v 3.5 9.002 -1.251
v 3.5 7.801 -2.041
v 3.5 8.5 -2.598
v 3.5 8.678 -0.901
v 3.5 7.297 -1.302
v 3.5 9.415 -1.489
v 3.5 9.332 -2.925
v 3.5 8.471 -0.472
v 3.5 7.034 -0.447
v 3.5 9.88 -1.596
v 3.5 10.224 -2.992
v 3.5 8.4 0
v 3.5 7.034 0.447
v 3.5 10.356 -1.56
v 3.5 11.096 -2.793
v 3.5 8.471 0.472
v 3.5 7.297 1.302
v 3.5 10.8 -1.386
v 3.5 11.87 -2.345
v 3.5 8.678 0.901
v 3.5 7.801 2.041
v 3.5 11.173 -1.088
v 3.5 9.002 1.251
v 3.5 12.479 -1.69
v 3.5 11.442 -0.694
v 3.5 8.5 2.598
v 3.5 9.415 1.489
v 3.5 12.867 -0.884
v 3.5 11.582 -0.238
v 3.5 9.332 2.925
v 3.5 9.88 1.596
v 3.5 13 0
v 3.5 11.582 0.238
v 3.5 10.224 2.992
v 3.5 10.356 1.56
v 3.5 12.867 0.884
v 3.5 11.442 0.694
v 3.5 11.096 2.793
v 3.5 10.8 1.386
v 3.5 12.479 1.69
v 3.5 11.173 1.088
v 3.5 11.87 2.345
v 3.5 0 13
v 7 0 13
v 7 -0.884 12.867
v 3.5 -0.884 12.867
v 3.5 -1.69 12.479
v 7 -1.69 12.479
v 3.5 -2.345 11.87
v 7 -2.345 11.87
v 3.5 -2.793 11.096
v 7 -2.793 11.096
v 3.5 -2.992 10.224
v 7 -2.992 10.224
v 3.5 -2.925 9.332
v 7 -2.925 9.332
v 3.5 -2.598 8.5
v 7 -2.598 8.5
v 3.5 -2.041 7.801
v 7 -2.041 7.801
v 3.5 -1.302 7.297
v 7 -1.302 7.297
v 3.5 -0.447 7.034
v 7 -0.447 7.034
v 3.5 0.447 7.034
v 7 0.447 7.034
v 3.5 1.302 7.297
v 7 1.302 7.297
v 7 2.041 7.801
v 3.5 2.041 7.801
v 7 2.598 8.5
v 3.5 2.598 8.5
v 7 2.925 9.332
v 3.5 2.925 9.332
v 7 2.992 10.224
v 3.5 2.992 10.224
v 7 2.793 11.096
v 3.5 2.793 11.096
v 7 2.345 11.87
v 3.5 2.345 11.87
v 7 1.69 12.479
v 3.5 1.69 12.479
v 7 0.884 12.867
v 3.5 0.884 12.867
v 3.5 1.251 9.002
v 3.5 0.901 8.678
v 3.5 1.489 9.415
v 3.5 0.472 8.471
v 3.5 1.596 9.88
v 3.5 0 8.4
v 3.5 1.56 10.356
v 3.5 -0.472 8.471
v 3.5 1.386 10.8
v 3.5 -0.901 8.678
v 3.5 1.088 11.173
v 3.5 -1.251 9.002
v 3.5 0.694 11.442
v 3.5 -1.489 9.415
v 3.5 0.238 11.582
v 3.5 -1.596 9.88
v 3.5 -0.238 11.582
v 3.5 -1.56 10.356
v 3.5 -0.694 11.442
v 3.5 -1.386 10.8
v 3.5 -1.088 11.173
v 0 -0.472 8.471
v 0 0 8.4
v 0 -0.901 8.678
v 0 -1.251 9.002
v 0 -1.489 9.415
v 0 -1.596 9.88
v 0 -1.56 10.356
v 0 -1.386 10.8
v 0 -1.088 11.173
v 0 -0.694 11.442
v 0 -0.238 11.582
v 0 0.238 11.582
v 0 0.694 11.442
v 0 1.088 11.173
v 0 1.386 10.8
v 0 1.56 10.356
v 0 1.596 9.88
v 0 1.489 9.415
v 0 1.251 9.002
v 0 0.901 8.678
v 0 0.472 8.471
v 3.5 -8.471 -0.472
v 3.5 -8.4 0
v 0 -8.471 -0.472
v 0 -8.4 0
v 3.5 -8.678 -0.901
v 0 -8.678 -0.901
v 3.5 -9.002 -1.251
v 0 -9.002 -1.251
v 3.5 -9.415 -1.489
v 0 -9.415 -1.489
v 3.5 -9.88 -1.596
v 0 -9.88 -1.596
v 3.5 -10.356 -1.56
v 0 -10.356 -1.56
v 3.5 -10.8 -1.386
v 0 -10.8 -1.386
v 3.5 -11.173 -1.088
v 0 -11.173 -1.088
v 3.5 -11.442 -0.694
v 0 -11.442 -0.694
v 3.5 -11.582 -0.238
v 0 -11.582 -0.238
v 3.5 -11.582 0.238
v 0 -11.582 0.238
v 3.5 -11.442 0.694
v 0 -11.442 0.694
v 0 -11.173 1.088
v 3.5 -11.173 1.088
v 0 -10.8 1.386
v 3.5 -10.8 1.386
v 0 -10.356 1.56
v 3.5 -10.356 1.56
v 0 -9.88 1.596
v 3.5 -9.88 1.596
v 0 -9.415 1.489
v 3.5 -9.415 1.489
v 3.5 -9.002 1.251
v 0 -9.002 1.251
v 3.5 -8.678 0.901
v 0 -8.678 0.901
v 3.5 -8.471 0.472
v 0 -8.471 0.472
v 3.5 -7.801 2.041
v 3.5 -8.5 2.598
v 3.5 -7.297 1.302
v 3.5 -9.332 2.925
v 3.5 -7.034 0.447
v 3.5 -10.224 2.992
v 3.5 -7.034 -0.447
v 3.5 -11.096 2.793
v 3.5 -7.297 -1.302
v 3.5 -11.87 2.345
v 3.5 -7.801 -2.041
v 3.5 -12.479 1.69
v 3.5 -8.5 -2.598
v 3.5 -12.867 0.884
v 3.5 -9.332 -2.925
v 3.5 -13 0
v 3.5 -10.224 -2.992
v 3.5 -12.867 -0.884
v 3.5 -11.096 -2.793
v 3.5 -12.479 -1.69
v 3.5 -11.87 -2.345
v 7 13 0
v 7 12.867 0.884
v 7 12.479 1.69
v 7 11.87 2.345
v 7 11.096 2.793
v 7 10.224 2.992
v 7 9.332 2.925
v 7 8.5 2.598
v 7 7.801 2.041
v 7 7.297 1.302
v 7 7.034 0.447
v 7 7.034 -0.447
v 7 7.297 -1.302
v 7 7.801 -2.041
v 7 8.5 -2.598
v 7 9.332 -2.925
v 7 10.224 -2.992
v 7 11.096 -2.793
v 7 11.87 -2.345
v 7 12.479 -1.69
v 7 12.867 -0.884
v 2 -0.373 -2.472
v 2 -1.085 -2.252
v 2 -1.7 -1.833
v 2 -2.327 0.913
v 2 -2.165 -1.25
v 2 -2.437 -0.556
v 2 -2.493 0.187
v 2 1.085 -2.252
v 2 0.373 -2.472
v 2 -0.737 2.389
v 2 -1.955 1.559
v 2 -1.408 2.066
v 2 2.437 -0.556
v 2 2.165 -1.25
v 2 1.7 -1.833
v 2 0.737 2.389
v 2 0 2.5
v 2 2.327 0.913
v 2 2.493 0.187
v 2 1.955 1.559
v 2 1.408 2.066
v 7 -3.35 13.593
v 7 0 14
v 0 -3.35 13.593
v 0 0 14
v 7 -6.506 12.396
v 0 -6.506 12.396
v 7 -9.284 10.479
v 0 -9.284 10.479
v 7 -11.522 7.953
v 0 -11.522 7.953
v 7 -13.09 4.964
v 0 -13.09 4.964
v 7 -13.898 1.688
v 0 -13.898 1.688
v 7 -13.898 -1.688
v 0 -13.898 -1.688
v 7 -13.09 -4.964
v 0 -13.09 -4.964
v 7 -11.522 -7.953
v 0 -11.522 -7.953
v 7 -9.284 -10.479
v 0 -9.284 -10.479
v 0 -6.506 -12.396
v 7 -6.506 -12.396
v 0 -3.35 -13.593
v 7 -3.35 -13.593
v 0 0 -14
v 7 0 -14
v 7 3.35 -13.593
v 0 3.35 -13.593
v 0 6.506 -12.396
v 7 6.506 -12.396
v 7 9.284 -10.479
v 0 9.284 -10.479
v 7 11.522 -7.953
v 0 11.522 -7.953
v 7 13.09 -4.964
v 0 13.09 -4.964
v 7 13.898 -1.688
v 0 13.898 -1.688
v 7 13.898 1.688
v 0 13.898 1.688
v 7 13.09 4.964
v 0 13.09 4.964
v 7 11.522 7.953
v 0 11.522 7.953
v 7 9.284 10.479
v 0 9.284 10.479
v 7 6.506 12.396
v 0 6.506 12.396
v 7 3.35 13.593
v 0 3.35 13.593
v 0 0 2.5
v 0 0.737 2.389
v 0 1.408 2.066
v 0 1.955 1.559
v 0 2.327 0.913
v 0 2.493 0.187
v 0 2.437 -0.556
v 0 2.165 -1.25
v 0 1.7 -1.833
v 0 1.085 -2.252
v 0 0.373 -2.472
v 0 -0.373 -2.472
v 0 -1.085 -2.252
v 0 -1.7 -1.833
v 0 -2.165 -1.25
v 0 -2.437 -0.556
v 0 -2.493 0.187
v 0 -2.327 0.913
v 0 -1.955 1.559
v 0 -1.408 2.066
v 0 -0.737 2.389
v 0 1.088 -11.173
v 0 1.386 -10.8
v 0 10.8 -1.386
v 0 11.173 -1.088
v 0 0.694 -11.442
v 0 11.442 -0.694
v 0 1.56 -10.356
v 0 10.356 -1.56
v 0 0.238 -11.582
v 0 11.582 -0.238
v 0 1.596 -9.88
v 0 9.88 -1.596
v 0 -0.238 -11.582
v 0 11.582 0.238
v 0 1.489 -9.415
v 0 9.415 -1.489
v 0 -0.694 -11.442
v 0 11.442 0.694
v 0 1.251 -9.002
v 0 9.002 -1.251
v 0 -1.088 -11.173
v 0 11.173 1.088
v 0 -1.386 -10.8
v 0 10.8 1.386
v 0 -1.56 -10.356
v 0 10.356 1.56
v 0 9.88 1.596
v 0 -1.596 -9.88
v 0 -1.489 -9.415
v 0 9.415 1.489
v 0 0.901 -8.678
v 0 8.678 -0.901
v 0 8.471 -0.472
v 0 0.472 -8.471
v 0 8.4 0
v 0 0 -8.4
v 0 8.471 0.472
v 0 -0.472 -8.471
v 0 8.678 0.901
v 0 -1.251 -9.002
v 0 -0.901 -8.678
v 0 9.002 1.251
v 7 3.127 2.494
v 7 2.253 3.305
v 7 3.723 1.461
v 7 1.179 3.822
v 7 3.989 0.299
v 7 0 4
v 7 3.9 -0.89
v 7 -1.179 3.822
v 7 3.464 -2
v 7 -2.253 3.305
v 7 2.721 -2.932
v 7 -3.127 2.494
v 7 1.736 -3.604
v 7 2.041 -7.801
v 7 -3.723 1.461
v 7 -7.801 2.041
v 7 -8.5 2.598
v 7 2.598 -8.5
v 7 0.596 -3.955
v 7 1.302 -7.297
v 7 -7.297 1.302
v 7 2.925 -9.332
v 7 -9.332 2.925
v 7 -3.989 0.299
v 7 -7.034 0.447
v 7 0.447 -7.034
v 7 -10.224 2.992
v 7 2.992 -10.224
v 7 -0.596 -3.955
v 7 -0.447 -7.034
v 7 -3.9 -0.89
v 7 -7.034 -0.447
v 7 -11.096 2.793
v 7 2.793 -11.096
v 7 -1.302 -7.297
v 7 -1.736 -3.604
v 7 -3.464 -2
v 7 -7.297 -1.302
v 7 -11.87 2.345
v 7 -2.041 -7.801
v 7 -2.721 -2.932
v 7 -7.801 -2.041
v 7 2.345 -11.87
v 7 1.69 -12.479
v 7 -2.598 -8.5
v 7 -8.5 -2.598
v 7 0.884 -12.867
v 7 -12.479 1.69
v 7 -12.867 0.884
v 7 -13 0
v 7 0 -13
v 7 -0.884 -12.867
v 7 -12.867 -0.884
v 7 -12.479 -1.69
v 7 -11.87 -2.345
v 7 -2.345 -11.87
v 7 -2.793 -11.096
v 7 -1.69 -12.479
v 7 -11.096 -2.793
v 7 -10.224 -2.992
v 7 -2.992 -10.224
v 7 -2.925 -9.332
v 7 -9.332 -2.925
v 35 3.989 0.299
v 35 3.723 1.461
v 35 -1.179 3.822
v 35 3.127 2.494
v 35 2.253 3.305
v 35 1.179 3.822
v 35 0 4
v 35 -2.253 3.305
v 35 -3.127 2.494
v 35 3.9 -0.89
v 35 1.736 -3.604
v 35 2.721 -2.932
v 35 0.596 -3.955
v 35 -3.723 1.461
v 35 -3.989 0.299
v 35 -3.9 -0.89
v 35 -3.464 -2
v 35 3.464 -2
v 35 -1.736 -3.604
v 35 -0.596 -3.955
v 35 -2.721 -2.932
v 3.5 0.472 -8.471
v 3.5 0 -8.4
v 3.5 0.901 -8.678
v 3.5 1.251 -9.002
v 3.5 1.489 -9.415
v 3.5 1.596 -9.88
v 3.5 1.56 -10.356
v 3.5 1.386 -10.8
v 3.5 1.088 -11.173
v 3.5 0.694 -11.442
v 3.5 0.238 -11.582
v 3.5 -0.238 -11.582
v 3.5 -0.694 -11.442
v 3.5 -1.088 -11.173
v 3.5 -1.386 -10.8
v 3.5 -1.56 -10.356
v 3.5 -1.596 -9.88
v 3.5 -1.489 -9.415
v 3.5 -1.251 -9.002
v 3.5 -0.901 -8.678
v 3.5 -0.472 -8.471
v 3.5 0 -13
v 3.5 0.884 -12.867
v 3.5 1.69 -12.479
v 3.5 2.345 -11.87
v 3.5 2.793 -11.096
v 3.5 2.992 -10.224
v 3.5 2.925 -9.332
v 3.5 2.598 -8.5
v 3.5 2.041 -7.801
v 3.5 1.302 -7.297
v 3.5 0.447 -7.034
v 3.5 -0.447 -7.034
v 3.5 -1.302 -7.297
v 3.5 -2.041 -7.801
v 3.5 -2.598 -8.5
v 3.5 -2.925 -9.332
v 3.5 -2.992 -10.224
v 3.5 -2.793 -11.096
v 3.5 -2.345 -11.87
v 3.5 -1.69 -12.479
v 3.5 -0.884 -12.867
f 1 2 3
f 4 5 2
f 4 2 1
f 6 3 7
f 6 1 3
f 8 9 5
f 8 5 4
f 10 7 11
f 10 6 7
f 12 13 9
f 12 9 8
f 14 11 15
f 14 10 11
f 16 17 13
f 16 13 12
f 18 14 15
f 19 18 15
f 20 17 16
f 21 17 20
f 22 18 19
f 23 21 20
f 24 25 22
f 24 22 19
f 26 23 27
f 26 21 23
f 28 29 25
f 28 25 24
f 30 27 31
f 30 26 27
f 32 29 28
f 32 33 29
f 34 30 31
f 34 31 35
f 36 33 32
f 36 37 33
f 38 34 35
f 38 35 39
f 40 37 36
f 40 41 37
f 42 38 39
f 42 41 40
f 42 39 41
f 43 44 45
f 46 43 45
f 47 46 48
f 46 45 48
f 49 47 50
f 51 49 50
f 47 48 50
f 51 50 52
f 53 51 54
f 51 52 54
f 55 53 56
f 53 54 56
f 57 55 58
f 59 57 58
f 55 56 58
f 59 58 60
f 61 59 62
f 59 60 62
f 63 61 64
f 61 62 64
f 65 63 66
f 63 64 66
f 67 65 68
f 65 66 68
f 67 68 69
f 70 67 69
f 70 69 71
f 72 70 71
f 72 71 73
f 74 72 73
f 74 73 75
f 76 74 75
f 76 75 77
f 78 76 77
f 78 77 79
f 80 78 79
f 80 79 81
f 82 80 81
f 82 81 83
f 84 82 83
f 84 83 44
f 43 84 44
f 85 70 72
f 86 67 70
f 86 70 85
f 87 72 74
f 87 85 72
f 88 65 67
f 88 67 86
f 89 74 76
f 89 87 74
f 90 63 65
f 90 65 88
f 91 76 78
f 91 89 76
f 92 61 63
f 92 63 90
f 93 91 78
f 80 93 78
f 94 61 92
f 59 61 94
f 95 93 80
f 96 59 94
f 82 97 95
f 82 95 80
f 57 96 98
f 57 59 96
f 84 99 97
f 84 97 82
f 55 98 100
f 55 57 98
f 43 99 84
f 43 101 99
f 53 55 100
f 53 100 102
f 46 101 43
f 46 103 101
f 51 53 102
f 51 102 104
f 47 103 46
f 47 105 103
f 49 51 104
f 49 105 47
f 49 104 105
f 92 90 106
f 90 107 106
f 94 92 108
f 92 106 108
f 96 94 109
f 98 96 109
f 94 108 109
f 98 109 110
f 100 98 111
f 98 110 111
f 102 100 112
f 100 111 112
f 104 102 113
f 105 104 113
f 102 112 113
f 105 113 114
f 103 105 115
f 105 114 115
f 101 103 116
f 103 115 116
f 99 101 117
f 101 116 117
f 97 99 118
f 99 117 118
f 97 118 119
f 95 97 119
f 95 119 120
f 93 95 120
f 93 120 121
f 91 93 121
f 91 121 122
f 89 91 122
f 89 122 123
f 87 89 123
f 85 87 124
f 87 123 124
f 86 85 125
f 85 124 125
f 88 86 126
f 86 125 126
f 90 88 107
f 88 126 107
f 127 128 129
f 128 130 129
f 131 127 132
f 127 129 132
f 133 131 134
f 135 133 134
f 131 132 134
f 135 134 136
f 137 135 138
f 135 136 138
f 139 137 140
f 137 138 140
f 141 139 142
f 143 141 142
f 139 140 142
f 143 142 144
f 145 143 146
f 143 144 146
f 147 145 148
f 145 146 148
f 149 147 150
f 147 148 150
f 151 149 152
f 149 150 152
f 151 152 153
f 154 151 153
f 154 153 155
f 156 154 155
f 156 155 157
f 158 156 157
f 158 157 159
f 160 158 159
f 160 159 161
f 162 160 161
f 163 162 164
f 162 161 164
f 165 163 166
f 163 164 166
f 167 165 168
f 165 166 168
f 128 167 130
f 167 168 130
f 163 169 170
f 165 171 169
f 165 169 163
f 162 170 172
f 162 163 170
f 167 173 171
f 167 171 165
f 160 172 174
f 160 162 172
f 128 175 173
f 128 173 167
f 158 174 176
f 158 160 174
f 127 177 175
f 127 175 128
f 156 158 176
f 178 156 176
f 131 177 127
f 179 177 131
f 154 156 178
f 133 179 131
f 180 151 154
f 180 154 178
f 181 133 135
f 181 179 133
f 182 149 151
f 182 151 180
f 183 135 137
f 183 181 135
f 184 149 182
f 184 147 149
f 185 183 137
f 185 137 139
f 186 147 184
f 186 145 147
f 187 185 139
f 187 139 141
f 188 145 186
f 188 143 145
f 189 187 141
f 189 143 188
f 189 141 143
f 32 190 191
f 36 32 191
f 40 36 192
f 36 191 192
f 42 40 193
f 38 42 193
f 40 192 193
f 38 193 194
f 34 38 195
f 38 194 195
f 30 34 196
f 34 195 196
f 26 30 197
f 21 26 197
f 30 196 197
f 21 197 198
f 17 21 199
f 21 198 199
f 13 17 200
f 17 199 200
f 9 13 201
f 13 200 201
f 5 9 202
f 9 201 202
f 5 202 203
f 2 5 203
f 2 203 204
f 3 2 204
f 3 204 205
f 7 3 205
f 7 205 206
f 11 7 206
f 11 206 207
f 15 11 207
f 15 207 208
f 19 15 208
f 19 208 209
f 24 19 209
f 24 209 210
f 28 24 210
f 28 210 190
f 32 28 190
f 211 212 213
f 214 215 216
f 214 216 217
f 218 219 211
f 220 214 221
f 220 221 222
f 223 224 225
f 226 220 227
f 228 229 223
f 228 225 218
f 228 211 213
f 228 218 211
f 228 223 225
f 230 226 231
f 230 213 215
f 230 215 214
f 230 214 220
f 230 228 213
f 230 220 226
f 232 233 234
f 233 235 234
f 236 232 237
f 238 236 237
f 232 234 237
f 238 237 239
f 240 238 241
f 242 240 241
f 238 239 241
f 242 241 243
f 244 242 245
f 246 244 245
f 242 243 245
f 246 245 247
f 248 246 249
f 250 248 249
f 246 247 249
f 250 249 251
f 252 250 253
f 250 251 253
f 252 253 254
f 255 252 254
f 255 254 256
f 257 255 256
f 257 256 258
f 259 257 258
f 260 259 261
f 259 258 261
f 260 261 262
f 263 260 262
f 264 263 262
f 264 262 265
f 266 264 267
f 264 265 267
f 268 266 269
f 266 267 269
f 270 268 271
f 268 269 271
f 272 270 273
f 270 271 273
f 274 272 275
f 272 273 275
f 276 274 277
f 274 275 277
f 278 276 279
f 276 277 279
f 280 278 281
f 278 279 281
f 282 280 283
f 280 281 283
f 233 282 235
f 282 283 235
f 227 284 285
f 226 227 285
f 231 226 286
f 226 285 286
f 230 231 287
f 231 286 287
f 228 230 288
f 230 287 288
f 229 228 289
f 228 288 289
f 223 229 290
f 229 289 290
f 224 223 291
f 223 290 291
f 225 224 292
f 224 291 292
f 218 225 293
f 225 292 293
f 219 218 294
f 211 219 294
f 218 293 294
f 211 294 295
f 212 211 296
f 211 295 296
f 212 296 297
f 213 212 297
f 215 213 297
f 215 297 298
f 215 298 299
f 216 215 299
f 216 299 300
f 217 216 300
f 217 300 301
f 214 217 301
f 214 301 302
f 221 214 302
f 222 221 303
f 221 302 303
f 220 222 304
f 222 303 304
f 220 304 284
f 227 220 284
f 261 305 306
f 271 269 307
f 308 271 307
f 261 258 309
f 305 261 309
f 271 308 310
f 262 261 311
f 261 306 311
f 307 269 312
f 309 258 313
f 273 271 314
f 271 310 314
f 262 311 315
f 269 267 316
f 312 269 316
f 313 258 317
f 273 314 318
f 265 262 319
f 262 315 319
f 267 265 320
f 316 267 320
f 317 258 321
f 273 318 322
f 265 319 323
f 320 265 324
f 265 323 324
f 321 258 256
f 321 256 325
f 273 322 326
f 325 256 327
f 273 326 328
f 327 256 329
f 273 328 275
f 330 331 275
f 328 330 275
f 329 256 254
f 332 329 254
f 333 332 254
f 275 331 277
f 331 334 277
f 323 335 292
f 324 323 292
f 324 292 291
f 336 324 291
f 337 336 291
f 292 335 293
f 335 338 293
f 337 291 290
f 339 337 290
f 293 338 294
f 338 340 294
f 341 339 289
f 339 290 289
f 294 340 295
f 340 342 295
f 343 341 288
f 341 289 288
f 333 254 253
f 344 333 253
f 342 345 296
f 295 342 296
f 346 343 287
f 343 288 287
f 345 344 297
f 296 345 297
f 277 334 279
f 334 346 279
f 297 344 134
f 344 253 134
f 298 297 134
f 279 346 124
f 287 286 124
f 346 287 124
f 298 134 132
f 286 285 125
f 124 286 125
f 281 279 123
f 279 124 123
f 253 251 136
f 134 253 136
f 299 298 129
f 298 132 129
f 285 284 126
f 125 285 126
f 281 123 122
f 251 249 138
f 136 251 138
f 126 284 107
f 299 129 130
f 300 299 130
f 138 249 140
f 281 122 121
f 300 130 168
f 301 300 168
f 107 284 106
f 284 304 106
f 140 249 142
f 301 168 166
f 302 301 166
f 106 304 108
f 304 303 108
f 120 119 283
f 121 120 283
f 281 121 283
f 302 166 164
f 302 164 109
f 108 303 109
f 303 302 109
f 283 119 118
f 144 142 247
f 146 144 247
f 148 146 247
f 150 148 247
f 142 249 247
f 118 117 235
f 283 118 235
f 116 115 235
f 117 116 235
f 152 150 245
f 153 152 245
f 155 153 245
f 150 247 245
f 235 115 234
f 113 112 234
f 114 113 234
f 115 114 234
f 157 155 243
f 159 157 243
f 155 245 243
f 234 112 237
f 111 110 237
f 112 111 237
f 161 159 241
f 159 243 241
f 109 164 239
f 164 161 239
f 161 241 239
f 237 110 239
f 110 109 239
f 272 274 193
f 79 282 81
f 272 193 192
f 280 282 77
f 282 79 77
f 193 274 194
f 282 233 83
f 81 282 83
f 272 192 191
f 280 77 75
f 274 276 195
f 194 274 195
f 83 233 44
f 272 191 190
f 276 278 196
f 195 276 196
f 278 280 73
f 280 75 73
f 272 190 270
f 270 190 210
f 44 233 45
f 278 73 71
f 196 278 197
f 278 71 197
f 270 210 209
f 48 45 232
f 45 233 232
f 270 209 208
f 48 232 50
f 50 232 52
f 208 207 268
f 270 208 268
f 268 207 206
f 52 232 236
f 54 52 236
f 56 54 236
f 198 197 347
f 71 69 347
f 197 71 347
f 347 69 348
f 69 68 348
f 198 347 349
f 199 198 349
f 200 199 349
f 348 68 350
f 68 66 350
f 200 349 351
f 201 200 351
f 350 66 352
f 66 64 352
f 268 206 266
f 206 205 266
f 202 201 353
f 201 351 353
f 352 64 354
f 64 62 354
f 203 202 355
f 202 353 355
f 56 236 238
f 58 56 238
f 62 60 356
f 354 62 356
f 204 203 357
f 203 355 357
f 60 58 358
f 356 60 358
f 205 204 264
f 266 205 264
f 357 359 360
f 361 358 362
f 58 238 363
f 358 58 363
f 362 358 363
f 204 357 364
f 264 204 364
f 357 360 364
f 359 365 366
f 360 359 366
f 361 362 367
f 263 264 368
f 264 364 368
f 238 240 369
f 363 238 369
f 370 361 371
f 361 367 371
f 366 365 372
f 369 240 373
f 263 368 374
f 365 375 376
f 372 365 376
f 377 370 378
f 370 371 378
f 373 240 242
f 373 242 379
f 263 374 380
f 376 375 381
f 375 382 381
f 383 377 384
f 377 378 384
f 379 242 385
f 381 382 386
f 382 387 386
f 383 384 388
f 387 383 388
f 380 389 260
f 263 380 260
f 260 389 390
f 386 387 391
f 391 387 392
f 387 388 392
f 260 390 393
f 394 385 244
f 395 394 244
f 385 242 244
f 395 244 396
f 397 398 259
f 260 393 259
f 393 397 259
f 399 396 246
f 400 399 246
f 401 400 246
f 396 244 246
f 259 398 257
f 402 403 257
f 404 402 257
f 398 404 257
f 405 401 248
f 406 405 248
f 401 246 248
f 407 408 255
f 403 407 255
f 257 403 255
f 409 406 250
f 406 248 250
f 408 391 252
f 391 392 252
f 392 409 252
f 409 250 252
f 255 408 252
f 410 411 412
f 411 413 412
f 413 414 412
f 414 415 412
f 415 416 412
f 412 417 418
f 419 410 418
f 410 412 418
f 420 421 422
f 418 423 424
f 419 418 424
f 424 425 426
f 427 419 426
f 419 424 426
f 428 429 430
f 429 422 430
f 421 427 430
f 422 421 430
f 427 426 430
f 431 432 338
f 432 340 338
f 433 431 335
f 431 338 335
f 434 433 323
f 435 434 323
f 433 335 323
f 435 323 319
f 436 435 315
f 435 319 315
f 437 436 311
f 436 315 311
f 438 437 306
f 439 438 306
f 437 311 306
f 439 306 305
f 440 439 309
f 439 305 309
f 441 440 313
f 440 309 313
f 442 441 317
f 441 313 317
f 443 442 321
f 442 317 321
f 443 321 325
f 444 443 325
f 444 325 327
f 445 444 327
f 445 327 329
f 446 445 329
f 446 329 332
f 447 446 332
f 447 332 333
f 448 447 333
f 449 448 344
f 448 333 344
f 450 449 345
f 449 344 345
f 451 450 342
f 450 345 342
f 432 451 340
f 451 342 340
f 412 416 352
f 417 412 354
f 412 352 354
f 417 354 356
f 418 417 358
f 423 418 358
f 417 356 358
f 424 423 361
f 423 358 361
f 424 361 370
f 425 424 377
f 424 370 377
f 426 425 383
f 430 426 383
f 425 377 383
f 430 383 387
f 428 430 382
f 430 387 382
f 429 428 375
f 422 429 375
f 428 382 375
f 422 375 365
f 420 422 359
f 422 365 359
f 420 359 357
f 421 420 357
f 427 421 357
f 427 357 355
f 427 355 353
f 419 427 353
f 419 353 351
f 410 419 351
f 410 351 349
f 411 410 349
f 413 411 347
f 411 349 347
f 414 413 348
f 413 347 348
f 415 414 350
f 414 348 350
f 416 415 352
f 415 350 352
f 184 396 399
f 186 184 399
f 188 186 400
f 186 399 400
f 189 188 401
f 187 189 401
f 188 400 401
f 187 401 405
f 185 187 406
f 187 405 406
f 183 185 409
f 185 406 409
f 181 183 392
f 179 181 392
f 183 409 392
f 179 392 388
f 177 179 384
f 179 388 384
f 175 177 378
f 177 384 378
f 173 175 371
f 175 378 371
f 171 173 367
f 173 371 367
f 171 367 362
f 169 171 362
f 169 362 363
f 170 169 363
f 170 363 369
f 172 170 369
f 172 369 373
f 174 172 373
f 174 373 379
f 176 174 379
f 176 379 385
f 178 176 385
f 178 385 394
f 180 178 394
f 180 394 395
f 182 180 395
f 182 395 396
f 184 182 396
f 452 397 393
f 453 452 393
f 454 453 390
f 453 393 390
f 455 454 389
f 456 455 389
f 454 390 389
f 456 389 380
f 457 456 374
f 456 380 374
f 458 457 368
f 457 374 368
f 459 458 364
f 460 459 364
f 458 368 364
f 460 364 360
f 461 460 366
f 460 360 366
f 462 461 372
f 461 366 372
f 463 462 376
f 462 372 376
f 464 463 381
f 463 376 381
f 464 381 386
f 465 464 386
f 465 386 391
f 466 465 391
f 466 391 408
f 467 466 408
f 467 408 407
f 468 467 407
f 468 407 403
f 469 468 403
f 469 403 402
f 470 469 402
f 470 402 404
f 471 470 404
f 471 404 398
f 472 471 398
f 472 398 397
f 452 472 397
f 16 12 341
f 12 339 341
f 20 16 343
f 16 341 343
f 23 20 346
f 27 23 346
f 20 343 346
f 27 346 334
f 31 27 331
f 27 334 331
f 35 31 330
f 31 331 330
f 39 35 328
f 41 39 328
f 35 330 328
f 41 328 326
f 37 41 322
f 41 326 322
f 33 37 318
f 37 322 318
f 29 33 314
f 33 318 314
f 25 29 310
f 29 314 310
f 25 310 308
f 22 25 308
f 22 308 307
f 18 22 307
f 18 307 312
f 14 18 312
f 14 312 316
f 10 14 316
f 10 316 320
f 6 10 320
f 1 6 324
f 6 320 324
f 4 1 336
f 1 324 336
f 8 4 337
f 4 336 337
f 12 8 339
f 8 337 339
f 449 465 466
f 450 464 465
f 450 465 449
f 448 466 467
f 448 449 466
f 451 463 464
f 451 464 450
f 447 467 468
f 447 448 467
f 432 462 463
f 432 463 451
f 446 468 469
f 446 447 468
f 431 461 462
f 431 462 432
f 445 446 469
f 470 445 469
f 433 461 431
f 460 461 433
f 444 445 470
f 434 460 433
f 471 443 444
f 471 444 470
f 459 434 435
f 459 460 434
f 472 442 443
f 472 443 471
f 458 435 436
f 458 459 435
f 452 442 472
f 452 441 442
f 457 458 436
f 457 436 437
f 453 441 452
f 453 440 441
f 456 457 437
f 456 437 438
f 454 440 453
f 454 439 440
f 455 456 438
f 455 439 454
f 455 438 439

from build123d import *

# Parameters (mm, degrees)
CBORE_FOR_M3_SBHCS1_D           = 3.2
CBORE_FOR_M3_SBHCS1_CBORE_D     = 6
CBORE_FOR_M3_SBHCS1_CBORE_DEPTH = 3.5
CIRPATTERN1_COUNT               = 4
SKETCH5_R                       = 2.5
CUT_EXTRUDE1_DEPTH              = 2


with BuildPart() as part:
    # Sketch2 → Revolve2 (revolve)
    with BuildSketch(Plane.XY, mode=Mode.PRIVATE) as revolve2_sk:
        Polygon((0, 14), (0, 0), (35, 0), (35, 4), (7, 4), (7, 14), align=None)
    revolve(revolve2_sk.sketch.rotate(Axis((0, 0, 0), (1, 0, 0)), 90), axis=Axis((0, 0, 0), (1, 0, 0)))

    # CBORE for M3 SBHCS1 (through all)
    with Locations(Plane(origin=(7, 0, 0), x_dir=(0, 0, -1), z_dir=(1, 0, 0))):
        with Locations((10, 0)):
            cbore_for_m3_sbhcs1 = CounterBoreHole(CBORE_FOR_M3_SBHCS1_D / 2, CBORE_FOR_M3_SBHCS1_CBORE_D / 2, CBORE_FOR_M3_SBHCS1_CBORE_DEPTH)

    # CirPattern1: CBORE for M3 SBHCS1 ×4 about axis
    cirpattern1_axis = Axis((0, 0, 0), (1, 0, 0))
    for i in range(1, CIRPATTERN1_COUNT):
        add(cbore_for_m3_sbhcs1.rotate(cirpattern1_axis, i * 360 / CIRPATTERN1_COUNT), mode=Mode.SUBTRACT)

    # Sketch5 → Cut-Extrude1 (cut)
    with BuildSketch(Plane.ZY):
        Circle(SKETCH5_R)
    extrude(amount=-CUT_EXTRUDE1_DEPTH, mode=Mode.SUBTRACT)


solid = part.part
